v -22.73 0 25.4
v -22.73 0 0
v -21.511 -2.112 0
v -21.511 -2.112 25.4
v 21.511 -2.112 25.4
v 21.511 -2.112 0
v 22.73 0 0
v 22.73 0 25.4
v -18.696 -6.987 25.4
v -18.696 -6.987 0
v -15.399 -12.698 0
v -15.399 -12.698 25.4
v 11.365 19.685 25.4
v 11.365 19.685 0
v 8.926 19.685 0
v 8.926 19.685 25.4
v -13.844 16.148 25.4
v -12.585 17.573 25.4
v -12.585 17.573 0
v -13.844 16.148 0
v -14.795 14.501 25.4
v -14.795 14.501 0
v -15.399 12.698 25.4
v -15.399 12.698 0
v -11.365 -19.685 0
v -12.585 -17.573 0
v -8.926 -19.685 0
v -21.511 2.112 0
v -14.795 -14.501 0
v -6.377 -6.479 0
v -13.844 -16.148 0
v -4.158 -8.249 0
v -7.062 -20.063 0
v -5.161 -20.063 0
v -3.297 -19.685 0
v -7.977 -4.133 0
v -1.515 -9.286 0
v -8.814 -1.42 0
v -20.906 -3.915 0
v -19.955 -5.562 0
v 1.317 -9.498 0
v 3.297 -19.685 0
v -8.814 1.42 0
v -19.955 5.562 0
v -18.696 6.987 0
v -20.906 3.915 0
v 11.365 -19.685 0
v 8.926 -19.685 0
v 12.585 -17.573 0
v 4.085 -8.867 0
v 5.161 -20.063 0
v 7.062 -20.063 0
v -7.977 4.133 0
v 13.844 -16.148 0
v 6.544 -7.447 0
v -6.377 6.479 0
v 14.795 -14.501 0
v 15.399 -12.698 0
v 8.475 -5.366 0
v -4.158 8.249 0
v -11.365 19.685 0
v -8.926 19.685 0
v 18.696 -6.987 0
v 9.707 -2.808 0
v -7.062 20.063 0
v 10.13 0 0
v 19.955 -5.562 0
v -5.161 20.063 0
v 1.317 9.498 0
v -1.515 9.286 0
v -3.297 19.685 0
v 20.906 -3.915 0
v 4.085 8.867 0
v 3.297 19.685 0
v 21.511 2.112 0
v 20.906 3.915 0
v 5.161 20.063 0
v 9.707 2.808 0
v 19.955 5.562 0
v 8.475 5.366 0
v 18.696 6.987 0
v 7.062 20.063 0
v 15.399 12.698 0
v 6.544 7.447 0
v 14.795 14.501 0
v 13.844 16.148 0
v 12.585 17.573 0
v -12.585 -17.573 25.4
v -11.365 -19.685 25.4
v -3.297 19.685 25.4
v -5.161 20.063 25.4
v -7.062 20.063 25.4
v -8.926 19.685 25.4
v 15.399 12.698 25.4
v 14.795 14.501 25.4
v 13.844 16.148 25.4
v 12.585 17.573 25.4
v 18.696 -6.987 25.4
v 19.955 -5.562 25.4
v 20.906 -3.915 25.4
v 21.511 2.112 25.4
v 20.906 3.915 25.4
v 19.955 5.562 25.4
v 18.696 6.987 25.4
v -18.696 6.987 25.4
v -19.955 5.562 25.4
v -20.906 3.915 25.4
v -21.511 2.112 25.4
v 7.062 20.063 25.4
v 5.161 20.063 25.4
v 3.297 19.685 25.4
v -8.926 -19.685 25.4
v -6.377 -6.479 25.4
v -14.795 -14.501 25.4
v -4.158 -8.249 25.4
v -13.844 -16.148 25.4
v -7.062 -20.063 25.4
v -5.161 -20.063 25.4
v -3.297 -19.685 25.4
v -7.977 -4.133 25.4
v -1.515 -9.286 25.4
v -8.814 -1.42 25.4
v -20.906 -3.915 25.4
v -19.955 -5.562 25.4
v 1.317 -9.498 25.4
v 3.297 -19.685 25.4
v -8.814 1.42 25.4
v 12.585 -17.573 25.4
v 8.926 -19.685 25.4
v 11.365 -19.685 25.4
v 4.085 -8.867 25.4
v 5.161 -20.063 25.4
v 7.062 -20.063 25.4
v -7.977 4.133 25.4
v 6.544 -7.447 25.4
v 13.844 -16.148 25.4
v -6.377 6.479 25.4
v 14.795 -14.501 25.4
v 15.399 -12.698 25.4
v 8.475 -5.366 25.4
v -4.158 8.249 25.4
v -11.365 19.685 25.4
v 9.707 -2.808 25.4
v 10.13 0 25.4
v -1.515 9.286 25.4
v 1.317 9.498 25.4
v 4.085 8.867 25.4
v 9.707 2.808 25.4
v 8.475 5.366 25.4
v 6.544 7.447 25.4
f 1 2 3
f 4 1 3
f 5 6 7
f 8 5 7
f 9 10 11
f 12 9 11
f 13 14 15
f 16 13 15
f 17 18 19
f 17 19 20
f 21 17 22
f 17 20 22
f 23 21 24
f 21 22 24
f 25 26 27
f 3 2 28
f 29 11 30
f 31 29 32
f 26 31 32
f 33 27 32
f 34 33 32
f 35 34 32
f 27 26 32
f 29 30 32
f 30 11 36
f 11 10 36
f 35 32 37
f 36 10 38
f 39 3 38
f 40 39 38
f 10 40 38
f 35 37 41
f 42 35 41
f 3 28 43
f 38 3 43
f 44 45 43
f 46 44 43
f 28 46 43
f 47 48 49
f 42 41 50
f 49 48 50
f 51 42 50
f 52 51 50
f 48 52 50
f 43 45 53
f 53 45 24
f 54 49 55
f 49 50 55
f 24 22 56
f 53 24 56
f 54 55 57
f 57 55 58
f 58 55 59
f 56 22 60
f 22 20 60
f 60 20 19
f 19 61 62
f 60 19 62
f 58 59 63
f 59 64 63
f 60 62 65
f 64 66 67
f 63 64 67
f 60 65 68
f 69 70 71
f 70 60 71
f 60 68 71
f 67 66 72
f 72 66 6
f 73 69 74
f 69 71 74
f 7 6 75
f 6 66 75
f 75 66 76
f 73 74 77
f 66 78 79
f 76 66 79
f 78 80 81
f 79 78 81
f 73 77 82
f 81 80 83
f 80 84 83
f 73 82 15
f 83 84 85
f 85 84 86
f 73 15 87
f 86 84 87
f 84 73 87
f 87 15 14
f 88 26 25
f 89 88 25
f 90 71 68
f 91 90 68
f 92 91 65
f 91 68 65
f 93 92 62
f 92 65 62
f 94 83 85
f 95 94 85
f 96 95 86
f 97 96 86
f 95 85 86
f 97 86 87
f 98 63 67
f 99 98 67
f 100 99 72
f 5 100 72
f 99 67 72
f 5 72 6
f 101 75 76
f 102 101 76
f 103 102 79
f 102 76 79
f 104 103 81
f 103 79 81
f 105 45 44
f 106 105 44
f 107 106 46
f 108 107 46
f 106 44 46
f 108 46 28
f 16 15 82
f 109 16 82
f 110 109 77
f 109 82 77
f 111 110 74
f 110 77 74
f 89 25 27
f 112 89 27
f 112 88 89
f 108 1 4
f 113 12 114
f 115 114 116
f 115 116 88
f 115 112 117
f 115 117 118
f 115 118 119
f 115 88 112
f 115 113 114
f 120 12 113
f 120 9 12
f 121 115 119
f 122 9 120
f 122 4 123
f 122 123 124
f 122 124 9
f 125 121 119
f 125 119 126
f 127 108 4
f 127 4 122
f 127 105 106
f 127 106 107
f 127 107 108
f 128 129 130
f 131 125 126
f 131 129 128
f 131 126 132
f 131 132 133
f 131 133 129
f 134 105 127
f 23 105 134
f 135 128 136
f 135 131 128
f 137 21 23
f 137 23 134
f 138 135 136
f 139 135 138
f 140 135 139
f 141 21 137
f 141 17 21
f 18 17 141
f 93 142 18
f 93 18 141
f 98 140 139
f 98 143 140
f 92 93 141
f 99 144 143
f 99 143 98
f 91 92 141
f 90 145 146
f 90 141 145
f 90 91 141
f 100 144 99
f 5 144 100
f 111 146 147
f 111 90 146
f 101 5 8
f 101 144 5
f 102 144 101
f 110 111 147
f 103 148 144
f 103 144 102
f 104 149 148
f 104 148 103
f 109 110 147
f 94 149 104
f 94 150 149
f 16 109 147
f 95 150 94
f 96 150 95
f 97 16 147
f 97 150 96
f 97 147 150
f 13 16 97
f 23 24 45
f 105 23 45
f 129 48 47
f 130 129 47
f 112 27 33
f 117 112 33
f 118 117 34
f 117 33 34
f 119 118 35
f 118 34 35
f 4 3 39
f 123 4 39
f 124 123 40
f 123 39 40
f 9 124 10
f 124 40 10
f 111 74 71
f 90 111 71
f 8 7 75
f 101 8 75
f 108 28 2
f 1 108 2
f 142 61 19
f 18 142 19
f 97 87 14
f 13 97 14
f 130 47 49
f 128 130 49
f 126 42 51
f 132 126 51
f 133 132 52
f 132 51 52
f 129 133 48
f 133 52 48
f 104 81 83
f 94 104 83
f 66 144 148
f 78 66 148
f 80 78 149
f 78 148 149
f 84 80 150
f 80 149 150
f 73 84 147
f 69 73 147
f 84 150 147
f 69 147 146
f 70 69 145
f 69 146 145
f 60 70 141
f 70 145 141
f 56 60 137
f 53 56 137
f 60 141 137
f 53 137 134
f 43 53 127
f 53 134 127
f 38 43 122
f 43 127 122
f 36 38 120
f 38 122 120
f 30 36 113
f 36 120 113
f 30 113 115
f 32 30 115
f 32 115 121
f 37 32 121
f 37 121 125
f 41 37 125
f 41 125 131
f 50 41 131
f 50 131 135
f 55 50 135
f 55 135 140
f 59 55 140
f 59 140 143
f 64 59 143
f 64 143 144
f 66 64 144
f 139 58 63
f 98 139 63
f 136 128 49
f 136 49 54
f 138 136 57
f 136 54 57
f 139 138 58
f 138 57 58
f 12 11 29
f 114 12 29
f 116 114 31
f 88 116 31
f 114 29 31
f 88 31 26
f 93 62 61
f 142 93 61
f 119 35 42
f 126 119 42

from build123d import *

# Parameters (mm, degrees)
F1_DEPTH = 25.4
F2_R     = 9.525
F3_DEPTH = 25.401


with BuildPart() as f1:
    # F0 (on Top) → F1 (new body)
    with BuildSketch(Plane.XY):
        with BuildLine():
            Line((-21.51077619, 2.1122427287), (-22.730280098, 0))
            Line((-22.730280098, 0), (-21.51077619, -2.1122427287))
            ThreePointArc((-21.51077619, -2.1122427287), (-21.7479316793, 0), (-21.51077619, 2.1122427287))
        make_face()
        with BuildLine():
            ThreePointArc((-18.6961097966, 6.9873879283), (-20.4718236503, 4.7625), (-21.51077619, 2.1122427287))
            Line((-21.51077619, 2.1122427287), (-18.6961097966, 6.9873879283))
        make_face()
        with BuildLine():
            Line((-18.6961097966, 6.9873879283), (-21.51077619, 2.1122427287))
            ThreePointArc((-21.51077619, 2.1122427287), (-21.7479316793, 0), (-21.51077619, -2.1122427287))
            Line((-21.51077619, -2.1122427287), (-18.6961097966, -6.9873879283))
            ThreePointArc((-18.6961097966, -6.9873879283), (-17.19259128, -8.1257681762), (-15.4942602985, -8.9456153542))
            ThreePointArc((-15.4942602985, -8.9456153542), (-10.8739658396, -2.3364773719), (-2.8401372205, -1.6397539888))
            ThreePointArc((-2.8401372205, -1.6397539888), (-2.7335496599, -0.8229543668), (-2.6979316793, 0))
            ThreePointArc((-2.6979316793, 0), (-2.7335496599, 0.8229543668), (-2.8401372205, 1.6397539888))
            ThreePointArc((-2.8401372205, 1.6397539888), (-10.8739658396, 2.3364773719), (-15.4942602985, 8.9456153542))
            ThreePointArc((-15.4942602985, 8.9456153542), (-17.19259128, 8.1257681762), (-18.6961097966, 6.9873879283))
        make_face()
        with BuildLine():
            Line((-18.6961097966, -6.9873879283), (-21.51077619, -2.1122427287))
            ThreePointArc((-21.51077619, -2.1122427287), (-20.4718236503, -4.7625), (-18.6961097966, -6.9873879283))
        make_face()
        with BuildLine():
            Line((-15.3993103504, 12.6976120717), (-18.6961097966, 6.9873879283))
            ThreePointArc((-18.6961097966, 6.9873879283), (-17.19259128, 8.1257681762), (-15.4942602985, 8.9456153542))
            ThreePointArc((-15.4942602985, 8.9456153542), (-15.6334173058, 10.8263367173), (-15.3993103504, 12.6976120717))
        make_face()
        with BuildLine():
            ThreePointArc((-15.4942602985, -8.9456153542), (-17.19259128, -8.1257681762), (-18.6961097966, -6.9873879283))
            Line((-18.6961097966, -6.9873879283), (-15.3993103504, -12.6976120717))
            ThreePointArc((-15.3993103504, -12.6976120717), (-15.6334173058, -10.8263367173), (-15.4942602985, -8.9456153542))
        make_face()
        with BuildLine():
            ThreePointArc((-12.584643957, 17.5727572713), (-14.3603578107, 15.347869343), (-15.3993103504, 12.6976120717))
            Line((-15.3993103504, 12.6976120717), (-12.584643957, 17.5727572713))
        make_face()
        with BuildLine():
            Line((-12.584643957, 17.5727572713), (-15.3993103504, 12.6976120717))
            ThreePointArc((-15.3993103504, 12.6976120717), (-15.6334173058, 10.8263367173), (-15.4942602985, 8.9456153542))
            ThreePointArc((-15.4942602985, 8.9456153542), (-7.4604316793, 8.248891971), (-2.8401372205, 1.6397539888))
            ThreePointArc((-2.8401372205, 1.6397539888), (-1.3489658396, 2.3364773719), (0, 3.2795079776))
            ThreePointArc((0, 3.2795079776), (-3.4135341604, 10.585369343), (0, 17.8912307084))
            ThreePointArc((0, 17.8912307084), (-1.5591739742, 18.9521048935), (-3.2967994463, 19.685))
            Line((-3.2967994463, 19.685), (-8.926132233, 19.685))
            ThreePointArc((-8.926132233, 19.685), (-10.8739658396, 18.834261314), (-12.584643957, 17.5727572713))
        make_face()
        with BuildLine():
            ThreePointArc((-15.4942602985, -8.9456153542), (-15.6334173058, -10.8263367173), (-15.3993103504, -12.6976120717))
            Line((-15.3993103504, -12.6976120717), (-12.584643957, -17.5727572713))
            ThreePointArc((-12.584643957, -17.5727572713), (-10.8739658396, -18.834261314), (-8.926132233, -19.685))
            Line((-8.926132233, -19.685), (-3.2967994463, -19.685))
            ThreePointArc((-3.2967994463, -19.685), (-1.5591739742, -18.9521048935), (0, -17.8912307084))
            ThreePointArc((0, -17.8912307084), (-3.4135341604, -10.585369343), (0, -3.2795079776))
            ThreePointArc((0, -3.2795079776), (-1.3489658396, -2.3364773719), (-2.8401372205, -1.6397539888))
            ThreePointArc((-2.8401372205, -1.6397539888), (-7.4604316793, -8.248891971), (-15.4942602985, -8.9456153542))
        make_face()
        with BuildLine():
            Line((-12.584643957, -17.5727572713), (-15.3993103504, -12.6976120717))
            ThreePointArc((-15.3993103504, -12.6976120717), (-14.3603578107, -15.347869343), (-12.584643957, -17.5727572713))
        make_face()
        with BuildLine():
            Line((-11.365140049, 19.685), (-12.584643957, 17.5727572713))
            ThreePointArc((-12.584643957, 17.5727572713), (-10.8739658396, 18.834261314), (-8.926132233, 19.685))
            Line((-8.926132233, 19.685), (-11.365140049, 19.685))
        make_face()
        with BuildLine():
            ThreePointArc((-8.926132233, -19.685), (-10.8739658396, -18.834261314), (-12.584643957, -17.5727572713))
            Line((-12.584643957, -17.5727572713), (-11.365140049, -19.685))
            Line((-11.365140049, -19.685), (-8.926132233, -19.685))
        make_face()
        with BuildLine():
            ThreePointArc((-3.2967994463, 19.685), (-6.1114658396, 20.110369343), (-8.926132233, 19.685))
            Line((-8.926132233, 19.685), (-3.2967994463, 19.685))
        make_face()
        with BuildLine():
            ThreePointArc((3.4135341604, 10.585369343), (2.5180572388, 6.5533777211), (0, 3.2795079776))
            ThreePointArc((0, 3.2795079776), (1.3489658396, 2.3364773719), (2.8401372205, 1.6397539888))
            ThreePointArc((2.8401372205, 1.6397539888), (7.4604316793, 8.248891971), (15.4942602985, 8.9456153542))
            ThreePointArc((15.4942602985, 8.9456153542), (15.600847859, 9.7624149761), (15.6364658396, 10.585369343))
            ThreePointArc((15.6364658396, 10.585369343), (15.5769912864, 11.6481266143), (15.3993103504, 12.6976120717))
            Line((15.3993103504, 12.6976120717), (12.584643957, 17.5727572713))
            ThreePointArc((12.584643957, 17.5727572713), (10.8739658396, 18.834261314), (8.926132233, 19.685))
            Line((8.926132233, 19.685), (3.2967994463, 19.685))
            ThreePointArc((3.2967994463, 19.685), (1.5591739742, 18.9521048935), (0, 17.8912307084))
            ThreePointArc((0, 17.8912307084), (2.5180572388, 14.6173609648), (3.4135341604, 10.585369343))
        make_face()
        with BuildLine():
            Line((-3.2967994463, -19.685), (-8.926132233, -19.685))
            ThreePointArc((-8.926132233, -19.685), (-6.1114658396, -20.110369343), (-3.2967994463, -19.685))
        make_face()
        with BuildLine():
            ThreePointArc((2.8401372205, -1.6397539888), (1.3489658396, -2.3364773719), (0, -3.2795079776))
            ThreePointArc((0, -3.2795079776), (2.5180572388, -6.5533777211), (3.4135341604, -10.585369343))
            ThreePointArc((3.4135341604, -10.585369343), (2.5180572388, -14.6173609648), (0, -17.8912307084))
            ThreePointArc((0, -17.8912307084), (1.5591739742, -18.9521048935), (3.2967994463, -19.685))
            Line((3.2967994463, -19.685), (8.926132233, -19.685))
            ThreePointArc((8.926132233, -19.685), (10.8739658396, -18.834261314), (12.584643957, -17.5727572713))
            Line((12.584643957, -17.5727572713), (15.3993103504, -12.6976120717))
            ThreePointArc((15.3993103504, -12.6976120717), (15.5769912864, -11.6481266143), (15.6364658396, -10.585369343))
            ThreePointArc((15.6364658396, -10.585369343), (15.600847859, -9.7624149761), (15.4942602985, -8.9456153542))
            ThreePointArc((15.4942602985, -8.9456153542), (7.4604316793, -8.248891971), (2.8401372205, -1.6397539888))
        make_face()
        with BuildLine():
            Line((3.2967994463, 19.685), (-3.2967994463, 19.685))
            ThreePointArc((-3.2967994463, 19.685), (-1.5591739742, 18.9521048935), (0, 17.8912307084))
            ThreePointArc((0, 17.8912307084), (1.5591739742, 18.9521048935), (3.2967994463, 19.685))
        make_face()
        with BuildLine():
            ThreePointArc((15.4942602985, 8.9456153542), (10.8739658396, 2.3364773719), (2.8401372205, 1.6397539888))
            ThreePointArc((2.8401372205, 1.6397539888), (2.6979316793, 0), (2.8401372205, -1.6397539888))
            ThreePointArc((2.8401372205, -1.6397539888), (10.8739658396, -2.3364773719), (15.4942602985, -8.9456153542))
            ThreePointArc((15.4942602985, -8.9456153542), (17.19259128, -8.1257681762), (18.6961097966, -6.9873879283))
            Line((18.6961097966, -6.9873879283), (21.51077619, -2.1122427287))
            ThreePointArc((21.51077619, -2.1122427287), (21.688457126, -1.0627572713), (21.7479316793, 0))
            ThreePointArc((21.7479316793, 0), (21.688457126, 1.0627572713), (21.51077619, 2.1122427287))
            Line((21.51077619, 2.1122427287), (18.6961097966, 6.9873879283))
            ThreePointArc((18.6961097966, 6.9873879283), (17.19259128, 8.1257681762), (15.4942602985, 8.9456153542))
        make_face()
        with BuildLine():
            ThreePointArc((0, -17.8912307084), (-1.5591739742, -18.9521048935), (-3.2967994463, -19.685))
            Line((-3.2967994463, -19.685), (3.2967994463, -19.685))
            ThreePointArc((3.2967994463, -19.685), (1.5591739742, -18.9521048935), (0, -17.8912307084))
        make_face()
        with BuildLine():
            ThreePointArc((8.926132233, 19.685), (6.1114658396, 20.110369343), (3.2967994463, 19.685))
            Line((3.2967994463, 19.685), (8.926132233, 19.685))
        make_face()
        with BuildLine():
            ThreePointArc((15.6364658396, 10.585369343), (15.600847859, 9.7624149761), (15.4942602985, 8.9456153542))
            ThreePointArc((15.4942602985, 8.9456153542), (17.19259128, 8.1257681762), (18.6961097966, 6.9873879283))
            Line((18.6961097966, 6.9873879283), (15.3993103504, 12.6976120717))
            ThreePointArc((15.3993103504, 12.6976120717), (15.5769912864, 11.6481266143), (15.6364658396, 10.585369343))
        make_face()
        with BuildLine():
            Line((8.926132233, -19.685), (3.2967994463, -19.685))
            ThreePointArc((3.2967994463, -19.685), (6.1114658396, -20.110369343), (8.926132233, -19.685))
        make_face()
        with BuildLine():
            ThreePointArc((18.6961097966, -6.9873879283), (17.19259128, -8.1257681762), (15.4942602985, -8.9456153542))
            ThreePointArc((15.4942602985, -8.9456153542), (15.600847859, -9.7624149761), (15.6364658396, -10.585369343))
            ThreePointArc((15.6364658396, -10.585369343), (15.5769912864, -11.6481266143), (15.3993103504, -12.6976120717))
            Line((15.3993103504, -12.6976120717), (18.6961097966, -6.9873879283))
        make_face()
        with BuildLine():
            Line((11.365140049, 19.685), (8.926132233, 19.685))
            ThreePointArc((8.926132233, 19.685), (10.8739658396, 18.834261314), (12.584643957, 17.5727572713))
            Line((12.584643957, 17.5727572713), (11.365140049, 19.685))
        make_face()
        with BuildLine():
            ThreePointArc((21.51077619, 2.1122427287), (20.4718236503, 4.7625), (18.6961097966, 6.9873879283))
            Line((18.6961097966, 6.9873879283), (21.51077619, 2.1122427287))
        make_face()
        with BuildLine():
            ThreePointArc((12.584643957, -17.5727572713), (10.8739658396, -18.834261314), (8.926132233, -19.685))
            Line((8.926132233, -19.685), (11.365140049, -19.685))
            Line((11.365140049, -19.685), (12.584643957, -17.5727572713))
        make_face()
        with BuildLine():
            Line((21.51077619, -2.1122427287), (18.6961097966, -6.9873879283))
            ThreePointArc((18.6961097966, -6.9873879283), (20.4718236503, -4.7625), (21.51077619, -2.1122427287))
        make_face()
        with BuildLine():
            ThreePointArc((15.3993103504, 12.6976120717), (14.3603578107, 15.347869343), (12.584643957, 17.5727572713))
            Line((12.584643957, 17.5727572713), (15.3993103504, 12.6976120717))
        make_face()
        with BuildLine():
            Line((22.730280098, 0), (21.51077619, 2.1122427287))
            ThreePointArc((21.51077619, 2.1122427287), (21.688457126, 1.0627572713), (21.7479316793, 0))
            ThreePointArc((21.7479316793, 0), (21.688457126, -1.0627572713), (21.51077619, -2.1122427287))
            Line((21.51077619, -2.1122427287), (22.730280098, 0))
        make_face()
        with BuildLine():
            Line((15.3993103504, -12.6976120717), (12.584643957, -17.5727572713))
            ThreePointArc((12.584643957, -17.5727572713), (14.3603578107, -15.347869343), (15.3993103504, -12.6976120717))
        make_face()
        with BuildLine():
            ThreePointArc((-2.8401372205, 1.6397539888), (-7.4604316793, 8.248891971), (-15.4942602985, 8.9456153542))
            ThreePointArc((-15.4942602985, 8.9456153542), (-10.8739658396, 2.3364773719), (-2.8401372205, 1.6397539888))
        make_face()
        with BuildLine():
            ThreePointArc((0, 17.8912307084), (-3.4135341604, 10.585369343), (0, 3.2795079776))
            ThreePointArc((0, 3.2795079776), (2.5180572388, 6.5533777211), (3.4135341604, 10.585369343))
            ThreePointArc((3.4135341604, 10.585369343), (2.5180572388, 14.6173609648), (0, 17.8912307084))
        make_face()
        with BuildLine():
            ThreePointArc((15.4942602985, 8.9456153542), (7.4604316793, 8.248891971), (2.8401372205, 1.6397539888))
            ThreePointArc((2.8401372205, 1.6397539888), (10.8739658396, 2.3364773719), (15.4942602985, 8.9456153542))
        make_face()
        with BuildLine():
            ThreePointArc((15.4942602985, -8.9456153542), (10.8739658396, -2.3364773719), (2.8401372205, -1.6397539888))
            ThreePointArc((2.8401372205, -1.6397539888), (7.4604316793, -8.248891971), (15.4942602985, -8.9456153542))
        make_face()
        with BuildLine():
            ThreePointArc((3.4135341604, -10.585369343), (2.5180572388, -6.5533777211), (0, -3.2795079776))
            ThreePointArc((0, -3.2795079776), (-3.4135341604, -10.585369343), (0, -17.8912307084))
            ThreePointArc((0, -17.8912307084), (2.5180572388, -14.6173609648), (3.4135341604, -10.585369343))
        make_face()
        with BuildLine():
            ThreePointArc((-2.8401372205, -1.6397539888), (-10.8739658396, -2.3364773719), (-15.4942602985, -8.9456153542))
            ThreePointArc((-15.4942602985, -8.9456153542), (-7.4604316793, -8.248891971), (-2.8401372205, -1.6397539888))
        make_face()
        with BuildLine():
            ThreePointArc((0, 3.2795079776), (-1.3489658396, 2.3364773719), (-2.8401372205, 1.6397539888))
            ThreePointArc((-2.8401372205, 1.6397539888), (-2.7335496599, 0.8229543668), (-2.6979316793, 0))
            ThreePointArc((-2.6979316793, 0), (-2.7335496599, -0.8229543668), (-2.8401372205, -1.6397539888))
            ThreePointArc((-2.8401372205, -1.6397539888), (-1.3489658396, -2.3364773719), (0, -3.2795079776))
            ThreePointArc((0, -3.2795079776), (1.3489658396, -2.3364773719), (2.8401372205, -1.6397539888))
            ThreePointArc((2.8401372205, -1.6397539888), (2.6979316793, 0), (2.8401372205, 1.6397539888))
            ThreePointArc((2.8401372205, 1.6397539888), (1.3489658396, 2.3364773719), (0, 3.2795079776))
        make_face()
    extrude(amount=F1_DEPTH)

    # F2 (on face) → F3 (cut, through all)
    with BuildSketch(Plane.XY.offset(25.4)):
        with Locations((0.6049536171, 0)):
            Circle(F2_R)
    extrude(amount=-F3_DEPTH, mode=Mode.SUBTRACT)


solid = f1.part
